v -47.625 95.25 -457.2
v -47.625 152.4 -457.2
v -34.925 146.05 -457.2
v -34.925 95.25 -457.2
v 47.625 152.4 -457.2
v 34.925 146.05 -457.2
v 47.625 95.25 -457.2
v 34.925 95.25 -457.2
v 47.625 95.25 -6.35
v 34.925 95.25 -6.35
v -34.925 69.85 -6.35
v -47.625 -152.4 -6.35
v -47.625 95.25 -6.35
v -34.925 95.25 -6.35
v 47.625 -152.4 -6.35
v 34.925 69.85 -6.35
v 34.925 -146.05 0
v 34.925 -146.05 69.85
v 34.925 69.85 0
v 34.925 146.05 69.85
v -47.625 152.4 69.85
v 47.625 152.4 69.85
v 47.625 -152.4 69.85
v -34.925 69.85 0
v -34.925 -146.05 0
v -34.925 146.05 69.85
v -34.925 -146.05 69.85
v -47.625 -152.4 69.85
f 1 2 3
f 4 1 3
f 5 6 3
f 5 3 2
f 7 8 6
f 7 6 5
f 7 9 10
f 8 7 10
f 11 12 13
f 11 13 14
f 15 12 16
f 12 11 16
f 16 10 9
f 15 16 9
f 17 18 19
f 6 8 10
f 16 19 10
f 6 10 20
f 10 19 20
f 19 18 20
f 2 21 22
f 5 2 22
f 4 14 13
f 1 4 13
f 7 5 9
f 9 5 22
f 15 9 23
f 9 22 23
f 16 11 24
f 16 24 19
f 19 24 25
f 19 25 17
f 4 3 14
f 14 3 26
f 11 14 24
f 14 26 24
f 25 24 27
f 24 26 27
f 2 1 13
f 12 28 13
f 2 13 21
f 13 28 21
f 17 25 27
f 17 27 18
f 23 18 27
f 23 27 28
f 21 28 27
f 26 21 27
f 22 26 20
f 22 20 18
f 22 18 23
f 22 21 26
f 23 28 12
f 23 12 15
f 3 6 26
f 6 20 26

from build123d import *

# Parameters (mm, degrees)
F0_W     = 95.25
F0_H     = 304.8
F0_W_2   = 69.85
F0_H_2   = 292.1
F1_DEPTH = 69.85
F2_DEPTH = 6.35
F3_W     = 69.85
F3_H     = 76.2
F4_DEPTH = 6.35
F6_DEPTH = 450.85


with BuildPart() as f1:
    # F0 (on Top) → F1 (new body)
    with BuildSketch(Plane.XY):
        Rectangle(F0_W, F0_H)
        Rectangle(F0_W_2, F0_H_2, mode=Mode.SUBTRACT)
    extrude(amount=F1_DEPTH)

    # F0 (on Top) → F2 (join)
    with BuildSketch(Plane.XY):
        Rectangle(F0_W, F0_H)
        Rectangle(F0_W_2, F0_H_2, mode=Mode.SUBTRACT)
        Rectangle(F0_W_2, F0_H_2)
    extrude(amount=-F2_DEPTH)

    # F3 (on face) → F4 (cut)
    with BuildSketch(Plane(origin=(0, 0, -6.35), x_dir=(1, 0, 0), z_dir=(0, 0, -1))):
        with Locations((0, -107.95)):
            Rectangle(F3_W, F3_H)
    extrude(amount=-F4_DEPTH, mode=Mode.SUBTRACT)

    # F5 (on face) → F6 (join)
    with BuildSketch(Plane(origin=(0, 0, -6.35), x_dir=(1, 0, 0), z_dir=(0, 0, -1))):
        Polygon((-47.625, -152.4), (47.625, -152.4), (47.625, -95.25), (34.925, -95.25), (34.925, -146.05), (-34.925, -146.05), (-34.925, -95.25), (-47.625, -95.25), align=None)
    extrude(amount=F6_DEPTH)


solid = f1.part
